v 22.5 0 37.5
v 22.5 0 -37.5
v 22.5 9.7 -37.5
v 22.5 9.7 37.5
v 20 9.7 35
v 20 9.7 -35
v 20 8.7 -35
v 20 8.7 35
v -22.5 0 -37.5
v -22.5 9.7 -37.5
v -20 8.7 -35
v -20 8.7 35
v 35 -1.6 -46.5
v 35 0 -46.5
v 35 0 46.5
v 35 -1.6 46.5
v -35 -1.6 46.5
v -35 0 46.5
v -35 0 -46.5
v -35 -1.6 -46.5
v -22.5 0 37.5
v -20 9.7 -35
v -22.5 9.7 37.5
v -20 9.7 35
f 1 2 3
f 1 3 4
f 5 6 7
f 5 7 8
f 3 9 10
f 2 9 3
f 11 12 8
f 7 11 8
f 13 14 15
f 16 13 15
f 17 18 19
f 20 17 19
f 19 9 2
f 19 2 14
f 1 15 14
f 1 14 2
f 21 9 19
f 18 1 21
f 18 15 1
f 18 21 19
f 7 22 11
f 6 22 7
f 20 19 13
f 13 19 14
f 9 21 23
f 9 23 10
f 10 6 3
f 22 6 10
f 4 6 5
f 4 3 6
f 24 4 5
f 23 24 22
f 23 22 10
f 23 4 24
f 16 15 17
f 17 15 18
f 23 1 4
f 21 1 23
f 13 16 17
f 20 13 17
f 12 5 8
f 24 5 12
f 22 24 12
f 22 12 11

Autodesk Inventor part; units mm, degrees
ref_plane "YZ Plane" through (0, 0, 0) normal (1, 0, 0) x (0, 1, 0)
ref_plane "XZ Plane" through (0, 0, 0) normal (0, 1, 0) x (-1, 0, 0)
ref_plane "XY Plane" through (0, 0, 0) normal (0, 0, 1) x (1, 0, 0)
sketch "Sketch1" plane through (0, 0, 0) normal (0, 1, 0) x (-1, 0, 0)
  line L0 (-35, 46.5) -> (35, 46.5)
  line L1 (35, 46.5) -> (35, -46.5)
  line L2 (35, -46.5) -> (-35, -46.5)
  line L3 (-35, -46.5) -> (-35, 46.5)
  line L4 (-35, 46.5) -> (35, -46.5) construction
  line L5 (35, 46.5) -> (-35, -46.5) construction
  line L6 (-22.5, 37.5) -> (22.5, 37.5)
  line L7 (22.5, 37.5) -> (22.5, -37.5)
  line L8 (22.5, -37.5) -> (-22.5, -37.5)
  line L9 (-22.5, -37.5) -> (-22.5, 37.5)
  line L10 (-22.5, 37.5) -> (22.5, -37.5) construction
  line L11 (22.5, 37.5) -> (-22.5, -37.5) construction
  point P0 (0, 0)
  dimension "d0" = 70
  dimension "d1" = 93
  dimension "d2" = 45
  dimension "d3" = 75
extrude "Extrusion1" add sketch "Sketch1" against normal blind 1.6 contours L0 L1 L2 L3 | L6 L7 L8 L9
extrude "Extrusion2" add sketch "Sketch1" along normal blind 9.7 contours L6 L7 L8 L9
sketch "Sketch2" plane through (0, 9.7, 0) normal (0, 1, 0) x (1, 0, 0)
  line L0 (20, -35) -> (-20, -35)
  line L1 (-20, -35) -> (-20, 35)
  line L2 (-20, 35) -> (20, 35)
  line L3 (20, 35) -> (20, -35)
  line L4 (20, -35) -> (-20, 35) construction
  line L5 (-20, -35) -> (20, 35) construction
  point P0 (0, 0)
  dimension "d8" = 40
  dimension "d9" = 70
extrude "Extrusion3" cut sketch "Sketch2" against normal blind 1
properties part number "LCD12864"
